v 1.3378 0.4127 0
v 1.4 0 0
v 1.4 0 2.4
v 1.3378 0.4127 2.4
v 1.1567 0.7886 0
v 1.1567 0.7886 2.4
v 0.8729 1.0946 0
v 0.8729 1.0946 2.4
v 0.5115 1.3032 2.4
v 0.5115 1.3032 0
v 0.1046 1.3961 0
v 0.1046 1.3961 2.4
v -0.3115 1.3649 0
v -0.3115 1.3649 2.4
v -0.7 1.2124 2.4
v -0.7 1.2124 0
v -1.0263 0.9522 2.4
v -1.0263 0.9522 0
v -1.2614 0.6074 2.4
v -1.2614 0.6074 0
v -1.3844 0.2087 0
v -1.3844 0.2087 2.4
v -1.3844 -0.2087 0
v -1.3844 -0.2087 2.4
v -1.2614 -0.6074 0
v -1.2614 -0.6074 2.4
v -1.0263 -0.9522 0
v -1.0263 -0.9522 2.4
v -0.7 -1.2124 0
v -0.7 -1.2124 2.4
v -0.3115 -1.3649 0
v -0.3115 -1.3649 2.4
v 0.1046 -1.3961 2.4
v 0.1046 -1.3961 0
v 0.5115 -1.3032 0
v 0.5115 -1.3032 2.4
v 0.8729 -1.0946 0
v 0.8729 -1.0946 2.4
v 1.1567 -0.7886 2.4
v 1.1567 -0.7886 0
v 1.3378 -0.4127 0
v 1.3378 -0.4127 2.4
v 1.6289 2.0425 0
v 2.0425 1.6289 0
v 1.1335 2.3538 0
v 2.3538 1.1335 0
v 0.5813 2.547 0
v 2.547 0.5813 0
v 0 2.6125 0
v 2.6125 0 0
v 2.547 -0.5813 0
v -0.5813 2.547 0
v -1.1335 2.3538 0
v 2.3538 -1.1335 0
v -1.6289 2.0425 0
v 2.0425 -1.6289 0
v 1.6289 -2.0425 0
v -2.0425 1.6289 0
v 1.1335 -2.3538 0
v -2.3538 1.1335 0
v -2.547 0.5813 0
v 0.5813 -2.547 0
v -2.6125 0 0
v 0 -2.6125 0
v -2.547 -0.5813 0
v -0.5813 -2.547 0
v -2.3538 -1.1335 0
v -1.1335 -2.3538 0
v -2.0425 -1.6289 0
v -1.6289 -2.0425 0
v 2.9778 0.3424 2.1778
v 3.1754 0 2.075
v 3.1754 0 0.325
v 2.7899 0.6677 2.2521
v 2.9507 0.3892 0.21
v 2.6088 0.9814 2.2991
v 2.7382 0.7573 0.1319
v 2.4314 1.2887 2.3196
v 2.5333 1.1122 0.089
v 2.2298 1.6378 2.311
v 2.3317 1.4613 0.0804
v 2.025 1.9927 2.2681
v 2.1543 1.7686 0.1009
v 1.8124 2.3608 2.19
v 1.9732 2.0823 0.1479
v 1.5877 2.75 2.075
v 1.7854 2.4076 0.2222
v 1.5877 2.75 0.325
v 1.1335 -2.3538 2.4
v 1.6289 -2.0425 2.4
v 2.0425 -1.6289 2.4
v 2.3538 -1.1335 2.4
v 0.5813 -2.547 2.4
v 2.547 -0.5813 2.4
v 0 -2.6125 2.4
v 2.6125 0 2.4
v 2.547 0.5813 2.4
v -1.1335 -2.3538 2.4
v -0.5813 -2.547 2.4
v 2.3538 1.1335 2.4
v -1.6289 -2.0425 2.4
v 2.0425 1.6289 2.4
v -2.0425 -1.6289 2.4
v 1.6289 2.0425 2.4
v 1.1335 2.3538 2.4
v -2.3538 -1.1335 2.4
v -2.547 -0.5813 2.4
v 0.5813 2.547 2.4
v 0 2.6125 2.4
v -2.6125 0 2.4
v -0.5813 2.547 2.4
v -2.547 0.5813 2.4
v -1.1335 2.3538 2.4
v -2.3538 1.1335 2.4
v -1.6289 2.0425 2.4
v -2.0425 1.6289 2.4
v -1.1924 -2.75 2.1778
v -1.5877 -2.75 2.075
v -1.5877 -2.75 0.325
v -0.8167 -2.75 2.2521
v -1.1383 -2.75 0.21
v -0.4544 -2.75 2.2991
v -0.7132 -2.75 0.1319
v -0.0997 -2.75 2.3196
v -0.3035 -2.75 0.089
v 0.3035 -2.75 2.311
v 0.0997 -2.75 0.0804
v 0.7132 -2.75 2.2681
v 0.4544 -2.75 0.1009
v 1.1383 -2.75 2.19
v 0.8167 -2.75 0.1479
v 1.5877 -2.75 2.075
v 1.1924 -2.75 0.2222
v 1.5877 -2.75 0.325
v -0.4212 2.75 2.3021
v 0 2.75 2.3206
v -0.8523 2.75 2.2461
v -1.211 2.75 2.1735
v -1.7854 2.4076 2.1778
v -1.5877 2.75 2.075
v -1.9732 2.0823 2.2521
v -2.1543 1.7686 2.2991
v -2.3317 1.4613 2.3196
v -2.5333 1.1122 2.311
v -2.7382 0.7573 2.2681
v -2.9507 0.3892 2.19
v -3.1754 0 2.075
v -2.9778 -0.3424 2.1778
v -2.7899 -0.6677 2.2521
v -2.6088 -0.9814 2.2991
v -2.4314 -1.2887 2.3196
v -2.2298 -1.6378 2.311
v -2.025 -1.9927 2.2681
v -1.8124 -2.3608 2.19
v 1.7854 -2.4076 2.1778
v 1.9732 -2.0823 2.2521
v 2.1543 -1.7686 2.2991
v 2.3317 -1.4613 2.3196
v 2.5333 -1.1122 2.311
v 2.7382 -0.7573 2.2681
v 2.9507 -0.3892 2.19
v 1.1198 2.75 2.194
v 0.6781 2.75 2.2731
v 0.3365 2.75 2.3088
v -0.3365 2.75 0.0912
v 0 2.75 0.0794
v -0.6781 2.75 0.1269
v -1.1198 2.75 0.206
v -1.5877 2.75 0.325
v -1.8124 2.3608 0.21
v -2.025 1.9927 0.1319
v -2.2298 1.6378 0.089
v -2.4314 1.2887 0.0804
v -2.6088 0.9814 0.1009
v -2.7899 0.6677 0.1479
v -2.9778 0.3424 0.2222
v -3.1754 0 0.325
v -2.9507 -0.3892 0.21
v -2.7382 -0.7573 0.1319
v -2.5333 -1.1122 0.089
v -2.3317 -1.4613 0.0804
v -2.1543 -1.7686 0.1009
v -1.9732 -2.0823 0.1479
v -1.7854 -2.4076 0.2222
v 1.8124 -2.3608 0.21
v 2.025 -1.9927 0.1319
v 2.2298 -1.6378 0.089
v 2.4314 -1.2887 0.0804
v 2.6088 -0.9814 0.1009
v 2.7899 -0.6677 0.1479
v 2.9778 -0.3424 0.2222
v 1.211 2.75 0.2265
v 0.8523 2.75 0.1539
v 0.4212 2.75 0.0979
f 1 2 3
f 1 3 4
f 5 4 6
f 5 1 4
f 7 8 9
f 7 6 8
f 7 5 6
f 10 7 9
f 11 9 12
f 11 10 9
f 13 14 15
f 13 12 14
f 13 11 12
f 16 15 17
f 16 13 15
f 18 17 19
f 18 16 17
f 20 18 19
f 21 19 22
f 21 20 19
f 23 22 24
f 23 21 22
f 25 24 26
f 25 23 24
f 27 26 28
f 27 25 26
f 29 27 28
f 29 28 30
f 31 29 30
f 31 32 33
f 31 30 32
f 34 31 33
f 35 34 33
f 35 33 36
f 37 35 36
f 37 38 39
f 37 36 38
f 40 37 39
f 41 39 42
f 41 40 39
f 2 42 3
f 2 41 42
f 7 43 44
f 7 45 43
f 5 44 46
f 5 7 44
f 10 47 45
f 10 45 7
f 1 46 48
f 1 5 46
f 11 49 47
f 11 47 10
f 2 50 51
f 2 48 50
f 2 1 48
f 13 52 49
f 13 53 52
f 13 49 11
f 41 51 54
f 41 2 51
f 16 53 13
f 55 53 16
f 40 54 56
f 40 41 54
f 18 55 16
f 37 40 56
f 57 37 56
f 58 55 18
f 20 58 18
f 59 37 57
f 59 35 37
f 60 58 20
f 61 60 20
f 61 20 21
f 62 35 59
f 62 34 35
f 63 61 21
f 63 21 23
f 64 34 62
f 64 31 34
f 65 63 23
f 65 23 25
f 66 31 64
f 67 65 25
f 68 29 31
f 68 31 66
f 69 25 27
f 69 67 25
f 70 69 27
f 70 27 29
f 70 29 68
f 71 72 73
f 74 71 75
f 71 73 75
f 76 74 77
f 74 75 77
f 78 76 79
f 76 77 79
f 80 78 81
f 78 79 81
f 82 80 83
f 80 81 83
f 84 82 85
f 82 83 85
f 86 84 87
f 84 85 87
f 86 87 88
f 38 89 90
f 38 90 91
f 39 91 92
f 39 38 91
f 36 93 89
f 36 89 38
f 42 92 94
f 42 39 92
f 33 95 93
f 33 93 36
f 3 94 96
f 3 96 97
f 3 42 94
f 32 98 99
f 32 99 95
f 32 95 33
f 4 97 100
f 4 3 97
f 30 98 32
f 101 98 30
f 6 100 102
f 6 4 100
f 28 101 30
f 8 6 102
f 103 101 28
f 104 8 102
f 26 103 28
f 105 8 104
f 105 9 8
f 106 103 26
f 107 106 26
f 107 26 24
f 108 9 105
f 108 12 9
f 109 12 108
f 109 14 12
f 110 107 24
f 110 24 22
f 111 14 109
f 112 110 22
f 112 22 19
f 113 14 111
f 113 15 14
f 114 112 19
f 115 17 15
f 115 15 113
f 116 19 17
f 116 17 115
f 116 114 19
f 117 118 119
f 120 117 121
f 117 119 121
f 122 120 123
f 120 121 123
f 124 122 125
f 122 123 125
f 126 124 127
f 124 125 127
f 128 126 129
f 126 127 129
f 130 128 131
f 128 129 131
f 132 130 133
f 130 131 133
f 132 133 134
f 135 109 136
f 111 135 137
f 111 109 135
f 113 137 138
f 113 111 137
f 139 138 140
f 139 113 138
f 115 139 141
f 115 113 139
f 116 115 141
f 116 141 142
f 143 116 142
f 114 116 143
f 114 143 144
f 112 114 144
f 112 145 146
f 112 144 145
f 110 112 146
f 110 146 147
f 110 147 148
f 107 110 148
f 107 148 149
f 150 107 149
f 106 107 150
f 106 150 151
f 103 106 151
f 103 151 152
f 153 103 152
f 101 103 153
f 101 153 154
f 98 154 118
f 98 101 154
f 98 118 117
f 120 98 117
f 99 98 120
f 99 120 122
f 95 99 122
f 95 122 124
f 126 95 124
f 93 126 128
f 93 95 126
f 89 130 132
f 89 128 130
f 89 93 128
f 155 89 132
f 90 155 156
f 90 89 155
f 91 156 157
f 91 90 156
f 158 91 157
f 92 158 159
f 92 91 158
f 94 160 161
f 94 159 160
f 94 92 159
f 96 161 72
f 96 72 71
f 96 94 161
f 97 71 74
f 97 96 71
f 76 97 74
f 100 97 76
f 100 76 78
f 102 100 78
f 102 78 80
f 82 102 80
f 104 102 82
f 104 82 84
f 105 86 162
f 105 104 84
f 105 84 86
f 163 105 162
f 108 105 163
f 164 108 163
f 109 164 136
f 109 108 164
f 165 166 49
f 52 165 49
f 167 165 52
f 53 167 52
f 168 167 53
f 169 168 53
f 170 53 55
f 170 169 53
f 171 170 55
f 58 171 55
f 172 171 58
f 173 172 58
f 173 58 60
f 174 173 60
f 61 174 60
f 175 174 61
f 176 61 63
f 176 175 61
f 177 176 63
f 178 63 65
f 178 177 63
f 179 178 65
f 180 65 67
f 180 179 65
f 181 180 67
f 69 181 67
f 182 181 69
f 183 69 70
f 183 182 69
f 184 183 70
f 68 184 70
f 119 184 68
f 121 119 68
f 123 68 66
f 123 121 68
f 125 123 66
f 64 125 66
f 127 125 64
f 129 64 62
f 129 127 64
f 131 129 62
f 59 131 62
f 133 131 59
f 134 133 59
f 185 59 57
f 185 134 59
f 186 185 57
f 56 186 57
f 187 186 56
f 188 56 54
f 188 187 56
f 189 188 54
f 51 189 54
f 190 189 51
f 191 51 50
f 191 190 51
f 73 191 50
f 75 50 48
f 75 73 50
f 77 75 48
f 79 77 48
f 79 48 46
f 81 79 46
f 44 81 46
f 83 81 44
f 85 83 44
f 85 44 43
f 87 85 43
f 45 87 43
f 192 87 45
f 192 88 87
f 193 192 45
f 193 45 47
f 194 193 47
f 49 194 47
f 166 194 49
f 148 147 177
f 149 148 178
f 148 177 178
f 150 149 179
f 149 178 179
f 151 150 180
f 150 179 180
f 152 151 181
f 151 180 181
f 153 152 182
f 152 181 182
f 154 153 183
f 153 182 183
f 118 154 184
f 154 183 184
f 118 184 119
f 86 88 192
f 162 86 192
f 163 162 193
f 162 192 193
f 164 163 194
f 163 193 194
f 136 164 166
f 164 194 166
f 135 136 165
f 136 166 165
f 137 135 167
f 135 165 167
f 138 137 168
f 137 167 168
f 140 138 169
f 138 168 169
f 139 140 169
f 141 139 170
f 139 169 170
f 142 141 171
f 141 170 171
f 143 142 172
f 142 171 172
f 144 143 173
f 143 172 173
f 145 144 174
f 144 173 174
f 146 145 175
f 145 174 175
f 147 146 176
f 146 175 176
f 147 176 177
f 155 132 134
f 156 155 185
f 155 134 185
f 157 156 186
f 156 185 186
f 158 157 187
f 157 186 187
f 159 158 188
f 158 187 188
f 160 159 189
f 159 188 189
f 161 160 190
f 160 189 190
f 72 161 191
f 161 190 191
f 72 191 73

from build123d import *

# Parameters (mm, degrees)
F_0181_EXTRUDE_DEPTH        = 2.4
F_0181_EXTRUDE_ROTATE_ANGLE = 120
F_0180_REVOLVE_ROTATE_ANGLE = 90
F_0183_CYLINDER_SKETCH_R    = 1.4
F_0183_CYLINDER_DEPTH       = 10


with BuildPart() as part:
    # 0181_extrude_Sketch → 0181_extrude (new body)
    with BuildSketch(Plane.XY):
        Polygon((0, 0), (3.175426481, 0), (4.763139721, 2.75), (3.175426481, 5.5), (0, 5.5), (-1.58771324, 2.75), align=None)
    extrude(amount=F_0181_EXTRUDE_DEPTH)


with BuildPart() as part_1:
    # 0181_extrude_Rotate: moved
    add(part.part.rotate(Axis((0, 0, 0), (0, 0, 1)), F_0181_EXTRUDE_ROTATE_ANGLE))


with BuildPart() as part_2:
    # 0181_extrude_Translate: moved
    add(part_1.part.moved(Location((3.175426481, 0, 0))))


with BuildPart() as body_2:
    # 0180_revolve_Sketch → 0180_revolve (revolve)
    with BuildSketch(Plane.XY, mode=Mode.PRIVATE) as f_0180_revolve_sk:
        Polygon((0, 0), (2.6125, 0), (3.675426481, 0.61368089), (3.675426481, 1.78631911), (2.6125, 2.4), (0, 2.4), align=None)
    revolve(f_0180_revolve_sk.sketch.rotate(Axis((0, -100, 0), (0, 1, 0)), 90), axis=Axis((0, -100, 0), (0, 1, 0)))


with BuildPart() as body_2_1:
    # 0180_revolve_Rotate: moved
    add(body_2.part.rotate(Axis((0, 0, 0), (1, 0, 0)), F_0180_REVOLVE_ROTATE_ANGLE))


with BuildPart() as part_3:
    add(part_2.part)

    # 0182_common: intersect body 2
    add(body_2_1.part, mode=Mode.INTERSECT)


with BuildPart() as body_2_2:
    # 0183_cylinder_Sketch → 0183_cylinder (new body)
    with BuildSketch(Plane.XY):
        Circle(F_0183_CYLINDER_SKETCH_R)
    extrude(amount=F_0183_CYLINDER_DEPTH)


with BuildPart() as body_2_2_1:
    # 0183_cylinder_Translate: moved
    add(body_2_2.part.moved(Location((0, 0, -5))))


with BuildPart() as part_4:
    add(part_3.part)

    # 0184_sub: cut body 2 2
    add(body_2_2_1.part, mode=Mode.SUBTRACT)


solid = part_4.part
